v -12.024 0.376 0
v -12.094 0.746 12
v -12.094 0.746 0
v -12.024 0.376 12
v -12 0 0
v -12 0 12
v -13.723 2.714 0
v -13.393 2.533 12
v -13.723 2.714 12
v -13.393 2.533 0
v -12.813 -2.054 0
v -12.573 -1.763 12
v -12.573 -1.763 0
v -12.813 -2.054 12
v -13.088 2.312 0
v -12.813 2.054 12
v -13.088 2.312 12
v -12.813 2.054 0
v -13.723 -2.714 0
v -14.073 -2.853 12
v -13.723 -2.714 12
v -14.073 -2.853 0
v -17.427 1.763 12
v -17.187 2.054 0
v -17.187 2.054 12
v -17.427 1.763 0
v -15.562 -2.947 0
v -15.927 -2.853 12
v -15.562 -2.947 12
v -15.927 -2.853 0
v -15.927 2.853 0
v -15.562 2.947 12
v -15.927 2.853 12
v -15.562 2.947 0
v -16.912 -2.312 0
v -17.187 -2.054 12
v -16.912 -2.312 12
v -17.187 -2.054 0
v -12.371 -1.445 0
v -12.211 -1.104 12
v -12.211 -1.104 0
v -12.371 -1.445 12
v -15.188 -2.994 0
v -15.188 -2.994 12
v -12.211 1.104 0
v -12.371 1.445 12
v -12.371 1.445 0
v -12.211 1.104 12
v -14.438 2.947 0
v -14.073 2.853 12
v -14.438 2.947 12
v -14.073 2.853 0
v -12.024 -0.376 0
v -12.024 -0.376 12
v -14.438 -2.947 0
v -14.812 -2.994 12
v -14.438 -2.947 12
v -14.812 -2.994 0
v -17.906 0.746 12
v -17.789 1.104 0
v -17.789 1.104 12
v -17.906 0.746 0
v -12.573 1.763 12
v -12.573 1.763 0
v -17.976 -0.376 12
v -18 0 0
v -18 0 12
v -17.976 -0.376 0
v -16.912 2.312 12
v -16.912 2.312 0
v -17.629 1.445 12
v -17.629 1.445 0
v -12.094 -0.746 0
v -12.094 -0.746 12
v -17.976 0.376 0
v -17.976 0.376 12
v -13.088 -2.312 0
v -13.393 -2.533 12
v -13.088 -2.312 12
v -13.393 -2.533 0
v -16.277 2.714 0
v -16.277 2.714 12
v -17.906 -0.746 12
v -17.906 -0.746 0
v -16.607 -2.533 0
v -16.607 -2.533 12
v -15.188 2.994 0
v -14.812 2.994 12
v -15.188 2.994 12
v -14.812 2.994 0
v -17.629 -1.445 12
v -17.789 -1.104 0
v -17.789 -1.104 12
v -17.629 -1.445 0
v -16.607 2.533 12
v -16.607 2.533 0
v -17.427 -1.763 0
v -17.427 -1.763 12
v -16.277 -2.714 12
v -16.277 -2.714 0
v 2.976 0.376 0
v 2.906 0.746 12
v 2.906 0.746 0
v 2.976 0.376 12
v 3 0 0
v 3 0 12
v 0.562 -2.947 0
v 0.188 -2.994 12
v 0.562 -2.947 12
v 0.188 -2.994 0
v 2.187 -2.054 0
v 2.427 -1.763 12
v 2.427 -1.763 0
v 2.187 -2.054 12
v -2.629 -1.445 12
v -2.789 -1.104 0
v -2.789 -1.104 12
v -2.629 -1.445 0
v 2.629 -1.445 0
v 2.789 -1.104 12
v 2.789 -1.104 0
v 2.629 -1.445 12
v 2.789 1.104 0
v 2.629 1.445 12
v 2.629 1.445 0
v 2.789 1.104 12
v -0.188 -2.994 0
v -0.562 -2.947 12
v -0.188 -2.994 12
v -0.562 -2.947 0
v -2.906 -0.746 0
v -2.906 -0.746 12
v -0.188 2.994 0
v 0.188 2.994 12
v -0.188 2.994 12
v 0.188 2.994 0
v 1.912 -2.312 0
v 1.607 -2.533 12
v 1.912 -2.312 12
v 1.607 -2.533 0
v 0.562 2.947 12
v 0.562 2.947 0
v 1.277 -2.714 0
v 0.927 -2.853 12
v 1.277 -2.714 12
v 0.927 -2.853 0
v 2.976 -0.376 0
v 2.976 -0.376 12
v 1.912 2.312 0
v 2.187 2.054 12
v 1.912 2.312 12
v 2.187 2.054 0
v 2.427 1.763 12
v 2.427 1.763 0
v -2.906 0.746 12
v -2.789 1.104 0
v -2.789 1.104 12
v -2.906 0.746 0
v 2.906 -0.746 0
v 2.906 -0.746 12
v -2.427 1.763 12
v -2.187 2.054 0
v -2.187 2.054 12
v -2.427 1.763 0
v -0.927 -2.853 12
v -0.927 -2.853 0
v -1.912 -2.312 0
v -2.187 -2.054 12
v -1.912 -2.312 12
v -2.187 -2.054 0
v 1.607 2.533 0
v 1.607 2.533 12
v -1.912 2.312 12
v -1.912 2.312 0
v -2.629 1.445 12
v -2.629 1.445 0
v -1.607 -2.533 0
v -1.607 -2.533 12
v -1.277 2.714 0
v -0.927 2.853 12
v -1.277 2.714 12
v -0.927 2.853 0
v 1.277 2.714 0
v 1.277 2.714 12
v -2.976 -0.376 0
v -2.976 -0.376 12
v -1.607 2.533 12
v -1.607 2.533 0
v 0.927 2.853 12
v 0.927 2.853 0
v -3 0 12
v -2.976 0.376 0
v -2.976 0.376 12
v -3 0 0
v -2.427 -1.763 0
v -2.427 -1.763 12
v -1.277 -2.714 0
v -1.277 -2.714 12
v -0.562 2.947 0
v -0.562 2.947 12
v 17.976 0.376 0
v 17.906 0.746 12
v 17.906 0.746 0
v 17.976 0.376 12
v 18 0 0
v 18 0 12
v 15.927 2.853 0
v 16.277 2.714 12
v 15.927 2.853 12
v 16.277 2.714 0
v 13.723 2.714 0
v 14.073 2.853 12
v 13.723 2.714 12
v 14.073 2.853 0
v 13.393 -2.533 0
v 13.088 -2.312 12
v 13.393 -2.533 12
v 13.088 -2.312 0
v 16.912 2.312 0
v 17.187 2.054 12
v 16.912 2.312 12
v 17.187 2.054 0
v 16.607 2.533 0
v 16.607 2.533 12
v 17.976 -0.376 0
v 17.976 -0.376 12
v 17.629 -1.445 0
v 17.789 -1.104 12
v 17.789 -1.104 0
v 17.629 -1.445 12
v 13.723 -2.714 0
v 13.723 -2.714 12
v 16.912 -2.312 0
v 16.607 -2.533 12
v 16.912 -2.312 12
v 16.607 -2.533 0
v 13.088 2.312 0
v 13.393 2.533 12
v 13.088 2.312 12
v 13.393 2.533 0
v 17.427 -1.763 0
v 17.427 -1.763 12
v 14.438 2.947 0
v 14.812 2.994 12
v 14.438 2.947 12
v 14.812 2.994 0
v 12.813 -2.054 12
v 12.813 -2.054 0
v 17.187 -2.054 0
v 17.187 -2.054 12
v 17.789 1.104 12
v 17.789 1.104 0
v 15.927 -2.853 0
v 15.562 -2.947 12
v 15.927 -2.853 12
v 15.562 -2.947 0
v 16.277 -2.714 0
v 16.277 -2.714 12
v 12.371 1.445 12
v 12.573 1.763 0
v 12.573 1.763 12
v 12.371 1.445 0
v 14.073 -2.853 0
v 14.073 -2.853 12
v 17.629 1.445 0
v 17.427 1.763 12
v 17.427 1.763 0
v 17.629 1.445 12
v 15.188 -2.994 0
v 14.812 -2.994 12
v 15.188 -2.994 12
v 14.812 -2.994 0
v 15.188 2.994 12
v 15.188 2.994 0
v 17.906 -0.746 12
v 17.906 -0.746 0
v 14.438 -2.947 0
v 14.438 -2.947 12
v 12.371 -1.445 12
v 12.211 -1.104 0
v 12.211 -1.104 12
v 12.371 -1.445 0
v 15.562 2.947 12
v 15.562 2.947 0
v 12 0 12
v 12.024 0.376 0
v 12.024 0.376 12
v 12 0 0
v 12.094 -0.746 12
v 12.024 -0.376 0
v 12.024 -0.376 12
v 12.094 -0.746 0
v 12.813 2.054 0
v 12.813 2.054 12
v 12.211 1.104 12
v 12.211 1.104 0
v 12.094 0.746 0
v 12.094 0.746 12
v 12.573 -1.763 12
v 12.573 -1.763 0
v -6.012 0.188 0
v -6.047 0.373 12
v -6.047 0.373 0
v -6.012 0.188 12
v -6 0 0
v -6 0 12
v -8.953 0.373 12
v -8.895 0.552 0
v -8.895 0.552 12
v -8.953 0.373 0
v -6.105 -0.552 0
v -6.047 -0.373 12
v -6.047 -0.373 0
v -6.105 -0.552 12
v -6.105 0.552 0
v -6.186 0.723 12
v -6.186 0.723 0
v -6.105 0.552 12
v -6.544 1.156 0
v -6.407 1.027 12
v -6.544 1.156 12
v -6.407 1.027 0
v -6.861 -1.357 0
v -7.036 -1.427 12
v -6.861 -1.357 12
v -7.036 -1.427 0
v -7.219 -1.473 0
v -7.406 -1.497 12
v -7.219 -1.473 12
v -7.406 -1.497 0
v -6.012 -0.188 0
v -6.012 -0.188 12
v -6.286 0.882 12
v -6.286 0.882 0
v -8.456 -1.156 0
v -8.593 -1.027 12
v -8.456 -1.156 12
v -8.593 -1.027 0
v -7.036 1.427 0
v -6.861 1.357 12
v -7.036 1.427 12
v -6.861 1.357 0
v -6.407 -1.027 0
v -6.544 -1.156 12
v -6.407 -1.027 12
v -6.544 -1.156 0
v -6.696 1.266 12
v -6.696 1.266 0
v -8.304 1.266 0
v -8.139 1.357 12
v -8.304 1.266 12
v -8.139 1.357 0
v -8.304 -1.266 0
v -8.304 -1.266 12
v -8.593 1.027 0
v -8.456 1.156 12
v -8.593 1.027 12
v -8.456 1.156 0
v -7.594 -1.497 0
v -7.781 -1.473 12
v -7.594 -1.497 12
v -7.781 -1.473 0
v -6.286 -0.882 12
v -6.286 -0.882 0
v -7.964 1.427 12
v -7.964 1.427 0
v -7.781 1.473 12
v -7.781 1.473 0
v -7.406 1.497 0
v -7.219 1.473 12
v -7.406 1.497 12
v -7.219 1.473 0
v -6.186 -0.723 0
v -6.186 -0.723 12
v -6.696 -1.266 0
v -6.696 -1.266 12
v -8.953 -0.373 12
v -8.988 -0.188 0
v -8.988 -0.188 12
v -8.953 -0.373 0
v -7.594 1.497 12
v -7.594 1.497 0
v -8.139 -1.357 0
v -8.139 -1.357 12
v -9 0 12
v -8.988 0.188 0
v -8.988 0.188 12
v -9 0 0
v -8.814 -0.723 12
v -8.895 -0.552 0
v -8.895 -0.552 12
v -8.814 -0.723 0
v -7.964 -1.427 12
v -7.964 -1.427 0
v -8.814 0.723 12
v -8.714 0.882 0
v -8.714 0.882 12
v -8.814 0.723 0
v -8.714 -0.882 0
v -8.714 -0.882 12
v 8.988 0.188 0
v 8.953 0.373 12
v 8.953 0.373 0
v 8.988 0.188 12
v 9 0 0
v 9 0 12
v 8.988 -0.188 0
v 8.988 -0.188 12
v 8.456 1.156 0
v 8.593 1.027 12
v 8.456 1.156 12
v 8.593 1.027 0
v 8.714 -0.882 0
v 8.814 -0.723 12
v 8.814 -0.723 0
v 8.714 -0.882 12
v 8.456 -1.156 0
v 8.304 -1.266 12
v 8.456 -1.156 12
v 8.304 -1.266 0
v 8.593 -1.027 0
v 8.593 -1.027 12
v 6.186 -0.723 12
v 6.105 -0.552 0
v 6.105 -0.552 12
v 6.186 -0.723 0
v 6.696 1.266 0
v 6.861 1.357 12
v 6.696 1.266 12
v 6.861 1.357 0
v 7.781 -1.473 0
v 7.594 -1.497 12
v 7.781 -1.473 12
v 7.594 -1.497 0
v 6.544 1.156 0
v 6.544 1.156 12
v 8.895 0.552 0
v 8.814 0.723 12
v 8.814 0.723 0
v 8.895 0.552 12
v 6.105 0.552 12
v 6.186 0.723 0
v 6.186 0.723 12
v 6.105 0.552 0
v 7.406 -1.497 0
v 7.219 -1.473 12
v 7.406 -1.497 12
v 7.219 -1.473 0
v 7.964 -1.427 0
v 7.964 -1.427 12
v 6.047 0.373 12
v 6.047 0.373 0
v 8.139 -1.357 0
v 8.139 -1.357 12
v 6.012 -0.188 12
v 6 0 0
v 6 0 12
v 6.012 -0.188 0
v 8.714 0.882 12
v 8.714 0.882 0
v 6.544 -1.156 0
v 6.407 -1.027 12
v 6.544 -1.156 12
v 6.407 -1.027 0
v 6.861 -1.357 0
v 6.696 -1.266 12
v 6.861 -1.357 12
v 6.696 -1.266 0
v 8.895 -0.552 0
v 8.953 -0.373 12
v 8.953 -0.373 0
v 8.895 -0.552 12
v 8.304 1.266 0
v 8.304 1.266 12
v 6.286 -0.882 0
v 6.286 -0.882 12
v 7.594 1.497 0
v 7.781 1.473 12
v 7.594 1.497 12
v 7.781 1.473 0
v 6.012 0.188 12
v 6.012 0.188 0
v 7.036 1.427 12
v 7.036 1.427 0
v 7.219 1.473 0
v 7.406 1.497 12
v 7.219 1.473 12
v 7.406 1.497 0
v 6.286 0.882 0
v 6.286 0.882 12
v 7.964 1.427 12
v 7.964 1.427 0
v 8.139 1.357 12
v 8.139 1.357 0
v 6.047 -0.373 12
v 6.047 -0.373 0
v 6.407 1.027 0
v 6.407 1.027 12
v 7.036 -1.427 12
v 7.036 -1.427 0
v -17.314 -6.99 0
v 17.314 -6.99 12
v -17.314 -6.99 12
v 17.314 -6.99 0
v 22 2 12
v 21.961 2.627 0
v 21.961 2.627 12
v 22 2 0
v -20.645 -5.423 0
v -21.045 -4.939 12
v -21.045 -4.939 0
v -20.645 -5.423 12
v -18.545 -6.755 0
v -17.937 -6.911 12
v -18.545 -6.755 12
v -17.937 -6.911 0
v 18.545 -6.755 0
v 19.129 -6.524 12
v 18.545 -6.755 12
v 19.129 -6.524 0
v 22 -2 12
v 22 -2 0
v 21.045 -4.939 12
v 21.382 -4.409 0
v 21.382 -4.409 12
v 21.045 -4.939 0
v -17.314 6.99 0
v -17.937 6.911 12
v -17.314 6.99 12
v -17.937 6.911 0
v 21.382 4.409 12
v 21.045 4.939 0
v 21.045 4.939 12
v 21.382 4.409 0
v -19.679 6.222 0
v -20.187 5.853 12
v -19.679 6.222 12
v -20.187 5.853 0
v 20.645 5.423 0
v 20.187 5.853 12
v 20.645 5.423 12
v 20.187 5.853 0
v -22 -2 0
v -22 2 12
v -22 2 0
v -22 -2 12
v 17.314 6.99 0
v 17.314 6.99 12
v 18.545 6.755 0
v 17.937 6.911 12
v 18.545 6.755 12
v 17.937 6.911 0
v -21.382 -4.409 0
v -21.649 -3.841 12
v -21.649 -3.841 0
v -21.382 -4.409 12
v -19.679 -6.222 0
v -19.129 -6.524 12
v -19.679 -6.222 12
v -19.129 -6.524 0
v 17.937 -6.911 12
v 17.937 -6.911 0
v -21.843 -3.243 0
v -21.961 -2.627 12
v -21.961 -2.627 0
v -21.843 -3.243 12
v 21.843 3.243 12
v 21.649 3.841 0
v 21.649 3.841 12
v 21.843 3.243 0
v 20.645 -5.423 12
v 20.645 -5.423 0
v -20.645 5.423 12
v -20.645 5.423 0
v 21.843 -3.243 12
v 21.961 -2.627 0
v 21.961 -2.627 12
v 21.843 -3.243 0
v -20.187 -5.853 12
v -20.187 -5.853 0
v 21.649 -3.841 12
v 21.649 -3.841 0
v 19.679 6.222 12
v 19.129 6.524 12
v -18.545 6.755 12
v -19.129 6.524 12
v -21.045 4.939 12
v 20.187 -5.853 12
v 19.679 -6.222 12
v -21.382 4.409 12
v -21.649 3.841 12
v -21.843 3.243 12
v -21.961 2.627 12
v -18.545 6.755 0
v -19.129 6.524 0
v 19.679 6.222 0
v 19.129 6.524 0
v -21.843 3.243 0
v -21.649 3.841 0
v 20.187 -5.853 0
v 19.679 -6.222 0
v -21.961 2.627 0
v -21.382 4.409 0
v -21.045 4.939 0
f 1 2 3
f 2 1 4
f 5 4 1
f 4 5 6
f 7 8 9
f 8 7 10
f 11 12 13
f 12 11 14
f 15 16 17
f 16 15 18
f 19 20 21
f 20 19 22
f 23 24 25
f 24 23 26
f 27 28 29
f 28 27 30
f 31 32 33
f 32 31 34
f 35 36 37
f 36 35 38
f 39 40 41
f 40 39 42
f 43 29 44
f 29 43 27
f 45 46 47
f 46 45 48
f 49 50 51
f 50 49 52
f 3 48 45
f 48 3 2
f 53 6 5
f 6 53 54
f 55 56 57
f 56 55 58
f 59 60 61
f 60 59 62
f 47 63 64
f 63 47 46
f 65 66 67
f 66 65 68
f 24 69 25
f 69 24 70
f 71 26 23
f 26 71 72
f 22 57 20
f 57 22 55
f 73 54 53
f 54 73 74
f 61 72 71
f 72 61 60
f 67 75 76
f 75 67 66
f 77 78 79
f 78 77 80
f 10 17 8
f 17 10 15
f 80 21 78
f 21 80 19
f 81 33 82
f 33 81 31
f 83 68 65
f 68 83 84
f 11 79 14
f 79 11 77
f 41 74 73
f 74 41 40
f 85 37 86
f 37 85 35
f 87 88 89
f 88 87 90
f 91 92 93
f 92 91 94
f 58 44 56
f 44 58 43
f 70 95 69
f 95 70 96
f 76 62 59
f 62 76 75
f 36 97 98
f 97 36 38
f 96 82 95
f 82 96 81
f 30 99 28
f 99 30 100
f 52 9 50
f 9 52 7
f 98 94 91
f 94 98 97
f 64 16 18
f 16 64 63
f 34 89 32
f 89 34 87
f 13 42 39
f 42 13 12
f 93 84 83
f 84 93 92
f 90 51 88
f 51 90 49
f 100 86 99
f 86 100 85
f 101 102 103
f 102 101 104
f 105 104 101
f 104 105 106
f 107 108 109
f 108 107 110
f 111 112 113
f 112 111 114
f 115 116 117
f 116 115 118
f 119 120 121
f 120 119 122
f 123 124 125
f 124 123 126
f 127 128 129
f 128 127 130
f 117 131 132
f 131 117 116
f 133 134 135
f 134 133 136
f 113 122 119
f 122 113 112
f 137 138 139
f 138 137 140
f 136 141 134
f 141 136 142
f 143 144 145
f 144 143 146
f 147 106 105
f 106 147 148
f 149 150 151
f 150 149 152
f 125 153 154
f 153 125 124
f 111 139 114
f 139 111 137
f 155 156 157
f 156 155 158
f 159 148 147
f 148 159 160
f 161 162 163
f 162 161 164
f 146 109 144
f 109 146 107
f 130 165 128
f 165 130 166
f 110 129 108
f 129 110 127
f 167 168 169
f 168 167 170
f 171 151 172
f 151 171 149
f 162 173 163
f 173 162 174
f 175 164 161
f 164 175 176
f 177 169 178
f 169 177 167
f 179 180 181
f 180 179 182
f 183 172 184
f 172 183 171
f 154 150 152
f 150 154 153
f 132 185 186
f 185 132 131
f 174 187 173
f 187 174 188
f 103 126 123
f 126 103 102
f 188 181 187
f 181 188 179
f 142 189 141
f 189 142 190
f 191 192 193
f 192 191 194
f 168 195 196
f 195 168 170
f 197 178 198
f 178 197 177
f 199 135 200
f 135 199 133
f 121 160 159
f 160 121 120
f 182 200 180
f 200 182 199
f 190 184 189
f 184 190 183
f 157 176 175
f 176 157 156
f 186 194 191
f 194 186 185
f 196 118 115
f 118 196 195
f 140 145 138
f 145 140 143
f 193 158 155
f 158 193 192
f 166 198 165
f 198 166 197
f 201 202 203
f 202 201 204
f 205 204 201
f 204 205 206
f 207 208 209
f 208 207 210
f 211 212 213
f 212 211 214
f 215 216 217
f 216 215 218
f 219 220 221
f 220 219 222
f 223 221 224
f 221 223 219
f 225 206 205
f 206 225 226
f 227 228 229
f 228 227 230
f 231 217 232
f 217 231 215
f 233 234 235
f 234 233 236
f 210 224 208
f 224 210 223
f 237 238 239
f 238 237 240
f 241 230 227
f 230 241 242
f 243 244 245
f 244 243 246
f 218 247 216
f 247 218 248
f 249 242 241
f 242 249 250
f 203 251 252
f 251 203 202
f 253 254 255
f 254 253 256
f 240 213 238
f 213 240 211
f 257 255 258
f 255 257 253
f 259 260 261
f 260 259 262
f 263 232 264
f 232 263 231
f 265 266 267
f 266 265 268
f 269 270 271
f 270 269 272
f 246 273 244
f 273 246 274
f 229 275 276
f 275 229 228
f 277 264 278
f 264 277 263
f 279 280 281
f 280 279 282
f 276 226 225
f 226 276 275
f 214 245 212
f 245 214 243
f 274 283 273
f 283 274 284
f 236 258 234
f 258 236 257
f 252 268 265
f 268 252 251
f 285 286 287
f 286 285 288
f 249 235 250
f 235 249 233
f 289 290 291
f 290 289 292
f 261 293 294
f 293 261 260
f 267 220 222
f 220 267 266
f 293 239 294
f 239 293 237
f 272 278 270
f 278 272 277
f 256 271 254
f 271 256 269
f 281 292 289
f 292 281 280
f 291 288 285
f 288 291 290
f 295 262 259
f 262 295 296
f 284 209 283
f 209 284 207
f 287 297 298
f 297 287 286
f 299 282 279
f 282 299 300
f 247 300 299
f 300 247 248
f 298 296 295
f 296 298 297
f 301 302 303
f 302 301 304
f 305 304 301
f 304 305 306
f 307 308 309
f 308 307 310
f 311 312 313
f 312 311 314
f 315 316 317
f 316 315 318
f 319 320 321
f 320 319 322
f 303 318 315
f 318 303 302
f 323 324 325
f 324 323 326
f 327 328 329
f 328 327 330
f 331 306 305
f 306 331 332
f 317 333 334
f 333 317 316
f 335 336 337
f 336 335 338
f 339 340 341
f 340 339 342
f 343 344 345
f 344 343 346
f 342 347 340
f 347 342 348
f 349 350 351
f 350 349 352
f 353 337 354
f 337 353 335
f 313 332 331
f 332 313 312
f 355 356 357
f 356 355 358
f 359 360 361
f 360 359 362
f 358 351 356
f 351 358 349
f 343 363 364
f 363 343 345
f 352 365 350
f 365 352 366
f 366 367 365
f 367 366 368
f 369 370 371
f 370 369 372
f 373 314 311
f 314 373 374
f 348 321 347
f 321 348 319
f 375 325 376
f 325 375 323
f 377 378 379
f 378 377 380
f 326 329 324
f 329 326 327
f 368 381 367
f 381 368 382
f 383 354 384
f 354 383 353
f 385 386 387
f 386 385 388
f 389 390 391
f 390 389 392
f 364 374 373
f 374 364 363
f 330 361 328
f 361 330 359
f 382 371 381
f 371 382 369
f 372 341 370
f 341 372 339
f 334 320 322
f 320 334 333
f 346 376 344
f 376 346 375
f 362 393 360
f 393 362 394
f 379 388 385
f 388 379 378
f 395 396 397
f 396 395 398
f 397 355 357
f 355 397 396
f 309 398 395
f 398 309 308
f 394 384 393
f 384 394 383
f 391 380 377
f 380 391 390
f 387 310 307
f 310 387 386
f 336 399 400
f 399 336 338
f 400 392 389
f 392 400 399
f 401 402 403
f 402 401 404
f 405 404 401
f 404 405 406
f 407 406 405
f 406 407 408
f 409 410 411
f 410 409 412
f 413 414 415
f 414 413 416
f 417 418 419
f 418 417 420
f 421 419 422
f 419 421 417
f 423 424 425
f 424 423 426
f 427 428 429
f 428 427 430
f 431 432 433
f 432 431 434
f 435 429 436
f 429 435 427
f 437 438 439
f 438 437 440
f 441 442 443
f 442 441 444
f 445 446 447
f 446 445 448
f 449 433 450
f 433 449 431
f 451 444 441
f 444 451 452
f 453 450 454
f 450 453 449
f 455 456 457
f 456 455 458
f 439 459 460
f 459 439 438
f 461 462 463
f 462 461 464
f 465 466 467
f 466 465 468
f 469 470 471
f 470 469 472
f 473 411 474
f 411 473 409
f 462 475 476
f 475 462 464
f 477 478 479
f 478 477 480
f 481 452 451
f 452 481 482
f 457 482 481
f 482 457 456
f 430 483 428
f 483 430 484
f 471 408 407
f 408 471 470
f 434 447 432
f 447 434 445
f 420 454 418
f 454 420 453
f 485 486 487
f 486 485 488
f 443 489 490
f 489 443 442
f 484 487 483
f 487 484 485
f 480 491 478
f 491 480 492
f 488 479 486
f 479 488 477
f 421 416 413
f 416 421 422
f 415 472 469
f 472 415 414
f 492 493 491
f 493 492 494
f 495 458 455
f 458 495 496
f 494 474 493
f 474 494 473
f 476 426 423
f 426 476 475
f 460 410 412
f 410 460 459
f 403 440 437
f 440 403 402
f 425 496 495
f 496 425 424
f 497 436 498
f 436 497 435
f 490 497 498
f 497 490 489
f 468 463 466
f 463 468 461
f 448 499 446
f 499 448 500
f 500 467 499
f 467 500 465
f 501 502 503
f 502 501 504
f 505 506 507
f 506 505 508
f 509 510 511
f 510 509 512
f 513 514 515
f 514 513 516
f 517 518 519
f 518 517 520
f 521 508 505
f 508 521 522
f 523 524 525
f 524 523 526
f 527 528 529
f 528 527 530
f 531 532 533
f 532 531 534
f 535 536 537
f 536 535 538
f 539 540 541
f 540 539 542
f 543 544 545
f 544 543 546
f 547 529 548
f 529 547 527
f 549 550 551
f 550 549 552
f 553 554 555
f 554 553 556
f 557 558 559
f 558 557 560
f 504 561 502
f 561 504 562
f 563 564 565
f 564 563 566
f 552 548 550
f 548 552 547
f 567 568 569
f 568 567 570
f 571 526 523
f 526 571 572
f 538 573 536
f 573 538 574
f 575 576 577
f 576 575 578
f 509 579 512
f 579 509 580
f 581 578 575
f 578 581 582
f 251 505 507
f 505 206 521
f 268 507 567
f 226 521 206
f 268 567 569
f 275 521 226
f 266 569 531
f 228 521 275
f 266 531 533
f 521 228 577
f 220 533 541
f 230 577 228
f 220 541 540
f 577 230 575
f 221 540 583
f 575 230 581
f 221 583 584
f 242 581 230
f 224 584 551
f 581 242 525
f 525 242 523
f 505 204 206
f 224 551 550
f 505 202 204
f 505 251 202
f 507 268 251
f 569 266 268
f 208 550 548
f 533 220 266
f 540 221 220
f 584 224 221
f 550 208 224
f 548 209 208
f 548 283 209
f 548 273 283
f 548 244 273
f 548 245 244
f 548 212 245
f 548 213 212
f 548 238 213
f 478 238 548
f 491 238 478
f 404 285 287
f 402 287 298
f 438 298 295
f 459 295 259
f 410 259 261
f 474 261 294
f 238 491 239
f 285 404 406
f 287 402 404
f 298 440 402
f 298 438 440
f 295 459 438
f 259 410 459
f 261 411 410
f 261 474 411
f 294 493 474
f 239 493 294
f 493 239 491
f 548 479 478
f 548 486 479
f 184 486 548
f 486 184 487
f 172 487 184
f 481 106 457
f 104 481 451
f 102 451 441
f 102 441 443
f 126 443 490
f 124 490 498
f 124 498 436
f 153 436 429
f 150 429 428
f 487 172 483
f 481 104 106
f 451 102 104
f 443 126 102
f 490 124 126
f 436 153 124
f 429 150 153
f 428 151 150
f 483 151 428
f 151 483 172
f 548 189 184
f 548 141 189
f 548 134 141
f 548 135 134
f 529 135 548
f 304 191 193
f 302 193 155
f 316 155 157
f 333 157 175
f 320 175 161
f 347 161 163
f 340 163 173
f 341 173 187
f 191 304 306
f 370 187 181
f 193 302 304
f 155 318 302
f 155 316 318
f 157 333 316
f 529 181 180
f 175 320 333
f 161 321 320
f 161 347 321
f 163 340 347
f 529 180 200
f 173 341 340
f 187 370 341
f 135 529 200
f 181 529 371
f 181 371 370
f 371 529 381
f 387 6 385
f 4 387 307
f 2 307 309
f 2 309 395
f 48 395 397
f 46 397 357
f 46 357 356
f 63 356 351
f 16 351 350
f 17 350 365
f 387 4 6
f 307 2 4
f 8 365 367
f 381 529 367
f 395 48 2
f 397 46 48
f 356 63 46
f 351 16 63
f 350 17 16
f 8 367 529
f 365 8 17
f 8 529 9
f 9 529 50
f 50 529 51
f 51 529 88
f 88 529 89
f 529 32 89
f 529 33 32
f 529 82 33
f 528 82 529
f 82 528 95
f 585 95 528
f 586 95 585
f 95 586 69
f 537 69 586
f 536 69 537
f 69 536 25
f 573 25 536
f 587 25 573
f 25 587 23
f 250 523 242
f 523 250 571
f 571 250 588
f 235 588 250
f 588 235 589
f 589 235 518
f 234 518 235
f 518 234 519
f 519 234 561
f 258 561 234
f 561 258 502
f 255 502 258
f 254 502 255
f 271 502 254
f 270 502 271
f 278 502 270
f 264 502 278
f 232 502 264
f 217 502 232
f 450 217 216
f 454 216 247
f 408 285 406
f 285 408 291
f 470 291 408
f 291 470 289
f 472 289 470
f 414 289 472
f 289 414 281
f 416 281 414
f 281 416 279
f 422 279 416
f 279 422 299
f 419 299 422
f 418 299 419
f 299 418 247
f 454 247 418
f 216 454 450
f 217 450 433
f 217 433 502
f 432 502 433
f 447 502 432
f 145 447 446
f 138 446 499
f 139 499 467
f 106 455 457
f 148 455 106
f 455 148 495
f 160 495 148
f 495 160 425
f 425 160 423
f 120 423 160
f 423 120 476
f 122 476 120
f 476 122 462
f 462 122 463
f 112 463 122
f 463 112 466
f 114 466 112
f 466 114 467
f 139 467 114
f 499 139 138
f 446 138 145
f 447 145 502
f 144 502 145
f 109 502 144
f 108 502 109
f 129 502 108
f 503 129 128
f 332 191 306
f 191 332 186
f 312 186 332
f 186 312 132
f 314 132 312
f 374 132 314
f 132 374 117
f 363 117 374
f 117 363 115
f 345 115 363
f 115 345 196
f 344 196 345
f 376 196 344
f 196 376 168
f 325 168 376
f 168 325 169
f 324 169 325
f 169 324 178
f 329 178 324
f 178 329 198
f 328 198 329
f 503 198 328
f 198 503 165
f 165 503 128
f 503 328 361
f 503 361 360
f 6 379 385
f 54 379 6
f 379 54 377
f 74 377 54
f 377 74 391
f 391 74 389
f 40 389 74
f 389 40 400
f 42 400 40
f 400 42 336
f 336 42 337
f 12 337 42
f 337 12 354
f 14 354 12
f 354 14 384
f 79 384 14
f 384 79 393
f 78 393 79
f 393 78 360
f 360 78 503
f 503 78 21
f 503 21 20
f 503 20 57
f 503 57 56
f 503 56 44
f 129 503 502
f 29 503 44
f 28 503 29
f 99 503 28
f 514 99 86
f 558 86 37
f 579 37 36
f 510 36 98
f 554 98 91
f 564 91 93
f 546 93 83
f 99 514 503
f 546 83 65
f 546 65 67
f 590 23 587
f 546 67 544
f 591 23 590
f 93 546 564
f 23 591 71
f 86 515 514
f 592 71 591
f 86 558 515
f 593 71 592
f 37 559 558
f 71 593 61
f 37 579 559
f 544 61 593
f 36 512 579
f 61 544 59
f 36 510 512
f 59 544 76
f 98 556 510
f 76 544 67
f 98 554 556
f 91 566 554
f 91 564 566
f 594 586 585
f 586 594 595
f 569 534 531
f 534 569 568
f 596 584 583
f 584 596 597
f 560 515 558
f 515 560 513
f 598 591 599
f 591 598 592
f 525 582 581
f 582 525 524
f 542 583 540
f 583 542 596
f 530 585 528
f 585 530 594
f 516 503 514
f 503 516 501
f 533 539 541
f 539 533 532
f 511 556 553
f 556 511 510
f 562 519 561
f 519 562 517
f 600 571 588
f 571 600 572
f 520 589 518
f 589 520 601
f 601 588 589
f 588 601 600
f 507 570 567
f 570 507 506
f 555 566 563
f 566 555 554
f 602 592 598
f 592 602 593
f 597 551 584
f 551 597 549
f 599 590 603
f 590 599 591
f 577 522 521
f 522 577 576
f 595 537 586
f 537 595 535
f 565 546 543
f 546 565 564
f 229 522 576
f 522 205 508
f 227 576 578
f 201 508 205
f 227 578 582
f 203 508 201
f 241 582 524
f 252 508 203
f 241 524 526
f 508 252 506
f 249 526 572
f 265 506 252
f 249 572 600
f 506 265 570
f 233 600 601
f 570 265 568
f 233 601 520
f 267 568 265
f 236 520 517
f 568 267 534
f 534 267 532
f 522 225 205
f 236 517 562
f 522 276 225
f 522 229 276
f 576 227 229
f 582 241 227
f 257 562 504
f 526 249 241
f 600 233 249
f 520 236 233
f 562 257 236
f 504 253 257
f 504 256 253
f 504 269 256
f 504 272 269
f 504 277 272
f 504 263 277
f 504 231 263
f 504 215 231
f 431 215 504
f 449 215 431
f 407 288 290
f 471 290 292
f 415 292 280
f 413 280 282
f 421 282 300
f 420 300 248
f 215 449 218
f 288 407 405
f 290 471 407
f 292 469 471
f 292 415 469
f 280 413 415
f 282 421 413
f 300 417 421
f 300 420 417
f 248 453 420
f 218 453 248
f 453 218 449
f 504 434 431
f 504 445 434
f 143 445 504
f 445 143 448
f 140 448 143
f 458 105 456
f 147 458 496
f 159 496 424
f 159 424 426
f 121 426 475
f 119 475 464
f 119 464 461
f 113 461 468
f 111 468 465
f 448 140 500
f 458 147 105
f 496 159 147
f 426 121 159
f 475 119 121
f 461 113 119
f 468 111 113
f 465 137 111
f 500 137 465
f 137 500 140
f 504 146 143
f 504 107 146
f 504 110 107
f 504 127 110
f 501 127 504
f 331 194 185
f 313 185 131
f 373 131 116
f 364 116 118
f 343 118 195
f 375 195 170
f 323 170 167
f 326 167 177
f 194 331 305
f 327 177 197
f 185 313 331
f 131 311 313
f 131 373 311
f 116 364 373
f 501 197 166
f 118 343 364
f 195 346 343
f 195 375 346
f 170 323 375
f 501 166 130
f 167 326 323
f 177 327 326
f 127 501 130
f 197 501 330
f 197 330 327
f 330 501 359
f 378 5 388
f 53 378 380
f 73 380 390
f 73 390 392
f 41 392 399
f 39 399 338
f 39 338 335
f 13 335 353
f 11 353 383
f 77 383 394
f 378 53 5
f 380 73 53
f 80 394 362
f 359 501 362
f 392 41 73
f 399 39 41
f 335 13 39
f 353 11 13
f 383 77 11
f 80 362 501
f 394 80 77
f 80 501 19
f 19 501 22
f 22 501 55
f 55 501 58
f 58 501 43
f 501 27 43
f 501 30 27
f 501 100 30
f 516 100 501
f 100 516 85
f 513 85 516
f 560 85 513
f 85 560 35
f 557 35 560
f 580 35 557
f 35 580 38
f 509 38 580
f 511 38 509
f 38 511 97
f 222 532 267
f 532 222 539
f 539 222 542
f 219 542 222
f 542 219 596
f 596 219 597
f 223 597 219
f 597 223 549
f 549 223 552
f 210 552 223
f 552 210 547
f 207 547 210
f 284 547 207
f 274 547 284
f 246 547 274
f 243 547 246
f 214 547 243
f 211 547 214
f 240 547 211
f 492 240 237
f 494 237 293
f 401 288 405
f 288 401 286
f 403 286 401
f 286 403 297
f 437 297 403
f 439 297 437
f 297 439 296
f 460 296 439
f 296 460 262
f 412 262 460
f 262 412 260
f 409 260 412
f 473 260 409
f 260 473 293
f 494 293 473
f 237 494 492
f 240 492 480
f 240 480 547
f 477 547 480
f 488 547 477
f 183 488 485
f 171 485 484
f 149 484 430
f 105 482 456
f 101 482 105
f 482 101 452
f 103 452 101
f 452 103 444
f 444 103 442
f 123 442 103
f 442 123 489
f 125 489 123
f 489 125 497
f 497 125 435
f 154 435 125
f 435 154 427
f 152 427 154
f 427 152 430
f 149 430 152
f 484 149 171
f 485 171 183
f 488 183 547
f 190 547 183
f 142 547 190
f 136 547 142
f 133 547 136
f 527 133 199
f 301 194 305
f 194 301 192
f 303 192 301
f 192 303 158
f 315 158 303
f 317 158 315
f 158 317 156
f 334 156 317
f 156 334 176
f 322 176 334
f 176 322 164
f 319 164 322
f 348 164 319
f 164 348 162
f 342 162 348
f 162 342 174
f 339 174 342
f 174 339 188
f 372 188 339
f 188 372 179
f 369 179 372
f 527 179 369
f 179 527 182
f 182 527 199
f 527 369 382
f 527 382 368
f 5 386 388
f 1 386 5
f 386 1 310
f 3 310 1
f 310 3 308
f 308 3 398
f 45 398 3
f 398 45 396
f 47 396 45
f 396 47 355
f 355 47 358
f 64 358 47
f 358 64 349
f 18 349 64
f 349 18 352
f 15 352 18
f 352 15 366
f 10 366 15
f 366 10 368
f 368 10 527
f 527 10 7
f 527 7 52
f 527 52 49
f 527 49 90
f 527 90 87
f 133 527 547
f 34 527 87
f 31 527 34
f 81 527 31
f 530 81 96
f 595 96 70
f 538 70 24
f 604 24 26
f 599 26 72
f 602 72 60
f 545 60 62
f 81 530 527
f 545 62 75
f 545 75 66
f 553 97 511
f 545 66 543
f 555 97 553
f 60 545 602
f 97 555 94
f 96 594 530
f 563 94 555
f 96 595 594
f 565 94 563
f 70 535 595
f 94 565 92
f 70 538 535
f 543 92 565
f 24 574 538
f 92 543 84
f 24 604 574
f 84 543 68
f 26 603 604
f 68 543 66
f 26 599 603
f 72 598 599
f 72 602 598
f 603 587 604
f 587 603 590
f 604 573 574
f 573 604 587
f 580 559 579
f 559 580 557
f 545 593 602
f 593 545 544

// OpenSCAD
$fn = 50;


difference() {
	union() {
		*color(alpha = 1.0000000000, c = "gray") {
			translate(v = [0, 7, 0]) {
				linear_extrude(height = 1) {
					text(font = "Arial:style=Bold", halign = "center", size = 4.5000000000, text = "COMMENT plate main", valign = "center");
				}
			}
		}
		hull() {
			translate(v = [-17.0000000000, 2.0000000000, 0]) {
				cylinder(h = 12, r = 5);
			}
			translate(v = [17.0000000000, 2.0000000000, 0]) {
				cylinder(h = 12, r = 5);
			}
			translate(v = [-17.0000000000, -2.0000000000, 0]) {
				cylinder(h = 12, r = 5);
			}
			translate(v = [17.0000000000, -2.0000000000, 0]) {
				cylinder(h = 12, r = 5);
			}
		}
	}
	union() {
		*color(alpha = 1.0000000000, c = "gray") {
			translate(v = [0, 7, 0]) {
				linear_extrude(height = 1) {
					text(font = "Arial:style=Bold", halign = "center", size = 4.5000000000, text = "COMMENT holes main", valign = "center");
				}
			}
		}
		translate(v = [-15.0000000000, 0.0000000000, 0]) {
			translate(v = [0, 0, -100]) {
				cylinder(h = 200, r = 3.0000000000);
			}
		}
		translate(v = [0, 0, -100]) {
			cylinder(h = 200, r = 3.0000000000);
		}
		translate(v = [15.0000000000, 0.0000000000, 0]) {
			translate(v = [0, 0, -100]) {
				cylinder(h = 200, r = 3.0000000000);
			}
		}
		translate(v = [-15.0000000000, 0.0000000000, 0]) {
			translate(v = [0, 0, -100]) {
				cylinder(h = 200, r = 1.5000000000);
			}
		}
		translate(v = [-7.5000000000, 0.0000000000, 0]) {
			translate(v = [0, 0, -100]) {
				cylinder(h = 200, r = 1.5000000000);
			}
		}
		translate(v = [0, 0, -100]) {
			cylinder(h = 200, r = 1.5000000000);
		}
		translate(v = [7.5000000000, 0.0000000000, 0]) {
			translate(v = [0, 0, -100]) {
				cylinder(h = 200, r = 1.5000000000);
			}
		}
		translate(v = [15.0000000000, 0.0000000000, 0]) {
			translate(v = [0, 0, -100]) {
				cylinder(h = 200, r = 1.5000000000);
			}
		}
	}
}
